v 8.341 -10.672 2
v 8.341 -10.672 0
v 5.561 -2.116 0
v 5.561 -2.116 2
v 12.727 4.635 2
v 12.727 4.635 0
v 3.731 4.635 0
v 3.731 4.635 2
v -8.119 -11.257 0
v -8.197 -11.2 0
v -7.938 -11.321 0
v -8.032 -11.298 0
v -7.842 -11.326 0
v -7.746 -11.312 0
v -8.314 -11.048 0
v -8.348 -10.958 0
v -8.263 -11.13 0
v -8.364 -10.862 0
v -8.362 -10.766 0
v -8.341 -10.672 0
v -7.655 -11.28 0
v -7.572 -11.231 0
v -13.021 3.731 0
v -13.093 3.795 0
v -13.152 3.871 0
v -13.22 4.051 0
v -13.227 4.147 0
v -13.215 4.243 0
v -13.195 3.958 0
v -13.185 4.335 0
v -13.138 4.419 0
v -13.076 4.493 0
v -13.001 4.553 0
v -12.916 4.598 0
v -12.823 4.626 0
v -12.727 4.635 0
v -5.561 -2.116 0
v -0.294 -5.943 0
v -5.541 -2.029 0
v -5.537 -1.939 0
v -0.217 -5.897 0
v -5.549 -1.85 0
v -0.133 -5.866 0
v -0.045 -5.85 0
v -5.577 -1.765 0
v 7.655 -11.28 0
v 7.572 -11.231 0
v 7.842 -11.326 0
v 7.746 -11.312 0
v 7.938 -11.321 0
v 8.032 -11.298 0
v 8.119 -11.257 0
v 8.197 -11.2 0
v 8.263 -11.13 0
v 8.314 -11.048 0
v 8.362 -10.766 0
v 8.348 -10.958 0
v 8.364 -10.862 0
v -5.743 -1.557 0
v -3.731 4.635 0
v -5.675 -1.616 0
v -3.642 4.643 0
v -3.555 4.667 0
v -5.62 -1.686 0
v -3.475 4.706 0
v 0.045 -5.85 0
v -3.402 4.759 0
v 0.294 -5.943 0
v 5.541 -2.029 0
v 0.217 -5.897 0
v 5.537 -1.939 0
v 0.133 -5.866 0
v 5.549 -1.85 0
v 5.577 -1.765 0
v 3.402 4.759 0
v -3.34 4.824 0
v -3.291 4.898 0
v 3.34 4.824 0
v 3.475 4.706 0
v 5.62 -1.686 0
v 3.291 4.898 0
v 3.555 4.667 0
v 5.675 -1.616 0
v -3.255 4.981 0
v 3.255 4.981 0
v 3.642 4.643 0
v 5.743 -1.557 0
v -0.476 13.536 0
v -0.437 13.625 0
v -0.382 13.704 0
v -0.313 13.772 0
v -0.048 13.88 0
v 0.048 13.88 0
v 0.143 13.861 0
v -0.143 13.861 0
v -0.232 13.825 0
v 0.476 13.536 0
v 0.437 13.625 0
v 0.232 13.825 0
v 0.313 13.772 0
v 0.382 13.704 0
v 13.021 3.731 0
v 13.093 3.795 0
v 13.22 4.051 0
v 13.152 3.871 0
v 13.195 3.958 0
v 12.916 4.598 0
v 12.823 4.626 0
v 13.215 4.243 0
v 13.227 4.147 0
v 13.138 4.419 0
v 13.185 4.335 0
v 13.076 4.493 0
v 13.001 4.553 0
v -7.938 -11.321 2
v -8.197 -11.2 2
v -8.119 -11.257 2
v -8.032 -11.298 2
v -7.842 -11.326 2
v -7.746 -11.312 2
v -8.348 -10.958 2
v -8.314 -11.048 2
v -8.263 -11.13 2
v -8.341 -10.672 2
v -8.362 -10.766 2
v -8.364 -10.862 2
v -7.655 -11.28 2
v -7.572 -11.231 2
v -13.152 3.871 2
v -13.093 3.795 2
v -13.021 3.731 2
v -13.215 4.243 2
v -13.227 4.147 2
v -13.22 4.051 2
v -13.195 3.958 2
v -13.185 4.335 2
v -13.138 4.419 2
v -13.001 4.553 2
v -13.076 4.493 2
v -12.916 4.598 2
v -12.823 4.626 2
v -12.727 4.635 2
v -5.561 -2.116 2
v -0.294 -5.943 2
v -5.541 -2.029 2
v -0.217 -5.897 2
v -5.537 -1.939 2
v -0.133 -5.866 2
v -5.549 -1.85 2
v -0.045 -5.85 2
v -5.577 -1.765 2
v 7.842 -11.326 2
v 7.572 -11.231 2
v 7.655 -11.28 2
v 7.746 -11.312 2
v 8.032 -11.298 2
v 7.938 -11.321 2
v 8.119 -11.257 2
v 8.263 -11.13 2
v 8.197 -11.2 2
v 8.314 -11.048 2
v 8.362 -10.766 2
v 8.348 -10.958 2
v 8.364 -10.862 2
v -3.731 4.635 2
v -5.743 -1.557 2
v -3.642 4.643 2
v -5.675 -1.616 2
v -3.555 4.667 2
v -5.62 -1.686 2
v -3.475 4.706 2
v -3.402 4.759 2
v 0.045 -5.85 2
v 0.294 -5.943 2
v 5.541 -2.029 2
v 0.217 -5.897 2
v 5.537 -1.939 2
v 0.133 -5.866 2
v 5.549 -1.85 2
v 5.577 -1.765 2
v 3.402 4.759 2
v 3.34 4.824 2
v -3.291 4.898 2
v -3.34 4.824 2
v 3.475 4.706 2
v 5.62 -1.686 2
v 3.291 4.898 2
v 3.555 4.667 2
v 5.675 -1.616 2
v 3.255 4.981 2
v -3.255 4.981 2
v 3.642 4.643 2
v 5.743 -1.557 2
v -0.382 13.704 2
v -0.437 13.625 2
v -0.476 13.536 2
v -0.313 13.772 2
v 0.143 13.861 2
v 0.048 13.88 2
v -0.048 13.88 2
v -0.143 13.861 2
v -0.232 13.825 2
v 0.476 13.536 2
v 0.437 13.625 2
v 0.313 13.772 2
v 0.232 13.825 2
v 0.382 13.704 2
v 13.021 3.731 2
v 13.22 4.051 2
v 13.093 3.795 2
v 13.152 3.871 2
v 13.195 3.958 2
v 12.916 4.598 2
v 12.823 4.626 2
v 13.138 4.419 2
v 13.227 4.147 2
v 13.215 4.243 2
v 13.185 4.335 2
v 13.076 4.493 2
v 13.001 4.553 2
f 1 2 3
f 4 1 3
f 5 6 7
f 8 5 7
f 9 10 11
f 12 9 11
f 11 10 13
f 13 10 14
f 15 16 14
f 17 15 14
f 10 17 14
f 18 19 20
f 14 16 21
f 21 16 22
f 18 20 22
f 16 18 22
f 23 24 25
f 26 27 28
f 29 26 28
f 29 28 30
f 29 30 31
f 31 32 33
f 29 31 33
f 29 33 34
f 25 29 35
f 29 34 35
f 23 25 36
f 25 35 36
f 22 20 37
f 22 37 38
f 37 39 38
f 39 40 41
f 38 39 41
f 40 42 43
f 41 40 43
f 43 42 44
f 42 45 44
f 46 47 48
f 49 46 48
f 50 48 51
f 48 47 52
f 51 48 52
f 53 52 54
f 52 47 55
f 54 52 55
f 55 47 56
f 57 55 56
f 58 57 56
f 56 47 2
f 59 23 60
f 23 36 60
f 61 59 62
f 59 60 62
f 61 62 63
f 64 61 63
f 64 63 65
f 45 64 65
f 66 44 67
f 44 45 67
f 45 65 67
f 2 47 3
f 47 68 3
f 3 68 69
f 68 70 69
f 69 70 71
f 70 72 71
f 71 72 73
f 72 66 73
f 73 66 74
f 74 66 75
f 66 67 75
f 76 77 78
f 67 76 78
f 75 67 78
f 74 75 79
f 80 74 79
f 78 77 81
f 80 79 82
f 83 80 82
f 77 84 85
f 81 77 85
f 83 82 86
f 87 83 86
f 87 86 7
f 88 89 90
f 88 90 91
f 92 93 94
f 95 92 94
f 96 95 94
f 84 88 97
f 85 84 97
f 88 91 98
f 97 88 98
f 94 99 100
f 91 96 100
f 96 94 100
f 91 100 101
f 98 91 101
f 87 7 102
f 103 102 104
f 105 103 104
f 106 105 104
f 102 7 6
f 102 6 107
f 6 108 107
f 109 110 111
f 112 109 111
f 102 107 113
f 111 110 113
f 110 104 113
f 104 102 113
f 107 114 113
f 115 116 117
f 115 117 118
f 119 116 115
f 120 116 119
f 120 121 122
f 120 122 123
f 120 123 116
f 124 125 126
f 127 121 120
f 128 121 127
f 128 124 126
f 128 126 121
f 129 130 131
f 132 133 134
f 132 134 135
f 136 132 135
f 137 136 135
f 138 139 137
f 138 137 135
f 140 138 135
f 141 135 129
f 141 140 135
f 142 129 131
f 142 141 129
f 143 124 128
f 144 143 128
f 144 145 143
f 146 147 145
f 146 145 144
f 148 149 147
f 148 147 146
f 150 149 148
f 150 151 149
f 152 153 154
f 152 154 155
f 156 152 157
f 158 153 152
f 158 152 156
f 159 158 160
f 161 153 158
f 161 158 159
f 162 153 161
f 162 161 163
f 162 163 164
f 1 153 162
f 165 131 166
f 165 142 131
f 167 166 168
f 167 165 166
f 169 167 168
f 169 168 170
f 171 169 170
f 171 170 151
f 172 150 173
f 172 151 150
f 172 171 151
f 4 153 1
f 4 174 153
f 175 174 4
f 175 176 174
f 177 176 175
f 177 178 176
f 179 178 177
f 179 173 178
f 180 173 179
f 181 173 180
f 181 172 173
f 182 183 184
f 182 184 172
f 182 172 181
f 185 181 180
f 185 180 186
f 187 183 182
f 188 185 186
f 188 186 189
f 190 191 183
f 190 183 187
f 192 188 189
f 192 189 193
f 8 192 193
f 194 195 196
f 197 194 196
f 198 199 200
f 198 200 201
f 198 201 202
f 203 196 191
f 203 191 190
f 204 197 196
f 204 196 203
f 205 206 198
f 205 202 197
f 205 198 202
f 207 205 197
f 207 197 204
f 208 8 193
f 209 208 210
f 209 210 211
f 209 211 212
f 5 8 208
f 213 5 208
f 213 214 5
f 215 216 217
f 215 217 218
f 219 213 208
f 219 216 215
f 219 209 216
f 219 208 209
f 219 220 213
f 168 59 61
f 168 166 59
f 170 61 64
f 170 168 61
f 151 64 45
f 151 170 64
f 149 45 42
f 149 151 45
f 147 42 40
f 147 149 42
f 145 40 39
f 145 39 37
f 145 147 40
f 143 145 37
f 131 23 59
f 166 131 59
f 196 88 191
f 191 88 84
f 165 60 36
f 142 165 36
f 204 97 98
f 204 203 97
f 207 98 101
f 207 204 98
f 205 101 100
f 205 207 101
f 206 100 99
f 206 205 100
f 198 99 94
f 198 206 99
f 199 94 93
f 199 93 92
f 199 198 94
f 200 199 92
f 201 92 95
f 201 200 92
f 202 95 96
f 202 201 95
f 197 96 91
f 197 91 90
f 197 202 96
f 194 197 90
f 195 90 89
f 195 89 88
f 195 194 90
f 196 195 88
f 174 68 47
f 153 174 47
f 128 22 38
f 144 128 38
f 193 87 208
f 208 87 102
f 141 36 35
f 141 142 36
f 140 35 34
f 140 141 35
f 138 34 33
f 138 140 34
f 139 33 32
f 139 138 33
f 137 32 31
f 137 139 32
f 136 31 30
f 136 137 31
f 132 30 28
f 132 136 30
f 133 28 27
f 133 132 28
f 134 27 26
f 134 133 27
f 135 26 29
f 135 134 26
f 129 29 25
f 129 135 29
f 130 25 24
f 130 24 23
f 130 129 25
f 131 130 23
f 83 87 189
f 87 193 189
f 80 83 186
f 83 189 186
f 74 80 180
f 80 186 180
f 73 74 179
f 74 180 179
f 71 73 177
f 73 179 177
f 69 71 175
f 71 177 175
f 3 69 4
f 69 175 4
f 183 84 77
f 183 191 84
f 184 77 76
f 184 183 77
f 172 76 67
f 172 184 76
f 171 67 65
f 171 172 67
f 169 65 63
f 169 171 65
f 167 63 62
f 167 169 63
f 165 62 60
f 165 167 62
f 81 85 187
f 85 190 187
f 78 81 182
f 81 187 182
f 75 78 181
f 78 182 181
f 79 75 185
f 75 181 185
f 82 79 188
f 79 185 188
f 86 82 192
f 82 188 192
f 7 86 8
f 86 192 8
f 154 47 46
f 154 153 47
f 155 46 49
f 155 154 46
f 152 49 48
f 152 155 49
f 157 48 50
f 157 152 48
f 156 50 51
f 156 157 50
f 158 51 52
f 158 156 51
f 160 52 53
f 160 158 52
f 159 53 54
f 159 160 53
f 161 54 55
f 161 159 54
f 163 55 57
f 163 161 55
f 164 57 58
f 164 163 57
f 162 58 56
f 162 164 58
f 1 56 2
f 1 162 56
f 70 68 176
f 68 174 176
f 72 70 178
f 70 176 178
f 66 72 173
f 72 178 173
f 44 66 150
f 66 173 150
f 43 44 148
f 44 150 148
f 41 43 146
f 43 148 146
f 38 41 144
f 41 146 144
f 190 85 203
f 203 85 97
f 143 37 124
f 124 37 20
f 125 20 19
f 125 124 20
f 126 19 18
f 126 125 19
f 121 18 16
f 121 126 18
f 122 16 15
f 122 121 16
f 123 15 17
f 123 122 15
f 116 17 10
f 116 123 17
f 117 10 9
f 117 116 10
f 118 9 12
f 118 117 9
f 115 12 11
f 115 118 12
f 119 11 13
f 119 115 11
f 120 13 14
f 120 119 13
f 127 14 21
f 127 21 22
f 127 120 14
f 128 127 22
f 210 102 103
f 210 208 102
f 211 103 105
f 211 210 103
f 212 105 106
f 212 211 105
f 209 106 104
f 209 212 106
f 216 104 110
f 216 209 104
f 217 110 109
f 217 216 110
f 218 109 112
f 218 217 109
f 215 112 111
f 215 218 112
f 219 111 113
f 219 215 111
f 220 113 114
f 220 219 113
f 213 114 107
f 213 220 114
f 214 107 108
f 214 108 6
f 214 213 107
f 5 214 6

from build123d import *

# Parameters (mm, degrees)
F1_DEPTH = 2
F2_R     = 0.5
F3_R     = 0.5


with BuildPart() as f1:
    # F0 (on Top) → F1 (new body)
    with BuildSketch(Plane.XY):
        Polygon((3.36771, 4.635255), (0, 15), (-3.36771, 4.635255), (-14.265848, 4.635255), (-5.449069, -1.77051), (-8.816779, -12.135255), (0, -5.72949), (8.816779, -12.135255), (5.449069, -1.77051), (14.265848, 4.635255), align=None)
    extrude(amount=F1_DEPTH)

    # F2
    f2_edges = [f1.edges().sort_by_distance(p)[0] for p in [
        (0, 15, 1),
        (-14.265848, 4.635255, 1),
        (14.265848, 4.635255, 1),
        (8.816779, -12.135255, 1),
        (-8.816779, -12.135255, 1),
    ]]
    fillet(f2_edges, radius=F2_R)

    # F3
    f3_edges = [f1.edges().sort_by_distance(p)[0] for p in [
        (0, -5.72949, 1),
        (5.449069, -1.77051, 1),
        (3.36771, 4.635255, 1),
        (-3.36771, 4.635255, 1),
        (-5.449069, -1.77051, 1),
    ]]
    fillet(f3_edges, radius=F3_R)


solid = f1.part
